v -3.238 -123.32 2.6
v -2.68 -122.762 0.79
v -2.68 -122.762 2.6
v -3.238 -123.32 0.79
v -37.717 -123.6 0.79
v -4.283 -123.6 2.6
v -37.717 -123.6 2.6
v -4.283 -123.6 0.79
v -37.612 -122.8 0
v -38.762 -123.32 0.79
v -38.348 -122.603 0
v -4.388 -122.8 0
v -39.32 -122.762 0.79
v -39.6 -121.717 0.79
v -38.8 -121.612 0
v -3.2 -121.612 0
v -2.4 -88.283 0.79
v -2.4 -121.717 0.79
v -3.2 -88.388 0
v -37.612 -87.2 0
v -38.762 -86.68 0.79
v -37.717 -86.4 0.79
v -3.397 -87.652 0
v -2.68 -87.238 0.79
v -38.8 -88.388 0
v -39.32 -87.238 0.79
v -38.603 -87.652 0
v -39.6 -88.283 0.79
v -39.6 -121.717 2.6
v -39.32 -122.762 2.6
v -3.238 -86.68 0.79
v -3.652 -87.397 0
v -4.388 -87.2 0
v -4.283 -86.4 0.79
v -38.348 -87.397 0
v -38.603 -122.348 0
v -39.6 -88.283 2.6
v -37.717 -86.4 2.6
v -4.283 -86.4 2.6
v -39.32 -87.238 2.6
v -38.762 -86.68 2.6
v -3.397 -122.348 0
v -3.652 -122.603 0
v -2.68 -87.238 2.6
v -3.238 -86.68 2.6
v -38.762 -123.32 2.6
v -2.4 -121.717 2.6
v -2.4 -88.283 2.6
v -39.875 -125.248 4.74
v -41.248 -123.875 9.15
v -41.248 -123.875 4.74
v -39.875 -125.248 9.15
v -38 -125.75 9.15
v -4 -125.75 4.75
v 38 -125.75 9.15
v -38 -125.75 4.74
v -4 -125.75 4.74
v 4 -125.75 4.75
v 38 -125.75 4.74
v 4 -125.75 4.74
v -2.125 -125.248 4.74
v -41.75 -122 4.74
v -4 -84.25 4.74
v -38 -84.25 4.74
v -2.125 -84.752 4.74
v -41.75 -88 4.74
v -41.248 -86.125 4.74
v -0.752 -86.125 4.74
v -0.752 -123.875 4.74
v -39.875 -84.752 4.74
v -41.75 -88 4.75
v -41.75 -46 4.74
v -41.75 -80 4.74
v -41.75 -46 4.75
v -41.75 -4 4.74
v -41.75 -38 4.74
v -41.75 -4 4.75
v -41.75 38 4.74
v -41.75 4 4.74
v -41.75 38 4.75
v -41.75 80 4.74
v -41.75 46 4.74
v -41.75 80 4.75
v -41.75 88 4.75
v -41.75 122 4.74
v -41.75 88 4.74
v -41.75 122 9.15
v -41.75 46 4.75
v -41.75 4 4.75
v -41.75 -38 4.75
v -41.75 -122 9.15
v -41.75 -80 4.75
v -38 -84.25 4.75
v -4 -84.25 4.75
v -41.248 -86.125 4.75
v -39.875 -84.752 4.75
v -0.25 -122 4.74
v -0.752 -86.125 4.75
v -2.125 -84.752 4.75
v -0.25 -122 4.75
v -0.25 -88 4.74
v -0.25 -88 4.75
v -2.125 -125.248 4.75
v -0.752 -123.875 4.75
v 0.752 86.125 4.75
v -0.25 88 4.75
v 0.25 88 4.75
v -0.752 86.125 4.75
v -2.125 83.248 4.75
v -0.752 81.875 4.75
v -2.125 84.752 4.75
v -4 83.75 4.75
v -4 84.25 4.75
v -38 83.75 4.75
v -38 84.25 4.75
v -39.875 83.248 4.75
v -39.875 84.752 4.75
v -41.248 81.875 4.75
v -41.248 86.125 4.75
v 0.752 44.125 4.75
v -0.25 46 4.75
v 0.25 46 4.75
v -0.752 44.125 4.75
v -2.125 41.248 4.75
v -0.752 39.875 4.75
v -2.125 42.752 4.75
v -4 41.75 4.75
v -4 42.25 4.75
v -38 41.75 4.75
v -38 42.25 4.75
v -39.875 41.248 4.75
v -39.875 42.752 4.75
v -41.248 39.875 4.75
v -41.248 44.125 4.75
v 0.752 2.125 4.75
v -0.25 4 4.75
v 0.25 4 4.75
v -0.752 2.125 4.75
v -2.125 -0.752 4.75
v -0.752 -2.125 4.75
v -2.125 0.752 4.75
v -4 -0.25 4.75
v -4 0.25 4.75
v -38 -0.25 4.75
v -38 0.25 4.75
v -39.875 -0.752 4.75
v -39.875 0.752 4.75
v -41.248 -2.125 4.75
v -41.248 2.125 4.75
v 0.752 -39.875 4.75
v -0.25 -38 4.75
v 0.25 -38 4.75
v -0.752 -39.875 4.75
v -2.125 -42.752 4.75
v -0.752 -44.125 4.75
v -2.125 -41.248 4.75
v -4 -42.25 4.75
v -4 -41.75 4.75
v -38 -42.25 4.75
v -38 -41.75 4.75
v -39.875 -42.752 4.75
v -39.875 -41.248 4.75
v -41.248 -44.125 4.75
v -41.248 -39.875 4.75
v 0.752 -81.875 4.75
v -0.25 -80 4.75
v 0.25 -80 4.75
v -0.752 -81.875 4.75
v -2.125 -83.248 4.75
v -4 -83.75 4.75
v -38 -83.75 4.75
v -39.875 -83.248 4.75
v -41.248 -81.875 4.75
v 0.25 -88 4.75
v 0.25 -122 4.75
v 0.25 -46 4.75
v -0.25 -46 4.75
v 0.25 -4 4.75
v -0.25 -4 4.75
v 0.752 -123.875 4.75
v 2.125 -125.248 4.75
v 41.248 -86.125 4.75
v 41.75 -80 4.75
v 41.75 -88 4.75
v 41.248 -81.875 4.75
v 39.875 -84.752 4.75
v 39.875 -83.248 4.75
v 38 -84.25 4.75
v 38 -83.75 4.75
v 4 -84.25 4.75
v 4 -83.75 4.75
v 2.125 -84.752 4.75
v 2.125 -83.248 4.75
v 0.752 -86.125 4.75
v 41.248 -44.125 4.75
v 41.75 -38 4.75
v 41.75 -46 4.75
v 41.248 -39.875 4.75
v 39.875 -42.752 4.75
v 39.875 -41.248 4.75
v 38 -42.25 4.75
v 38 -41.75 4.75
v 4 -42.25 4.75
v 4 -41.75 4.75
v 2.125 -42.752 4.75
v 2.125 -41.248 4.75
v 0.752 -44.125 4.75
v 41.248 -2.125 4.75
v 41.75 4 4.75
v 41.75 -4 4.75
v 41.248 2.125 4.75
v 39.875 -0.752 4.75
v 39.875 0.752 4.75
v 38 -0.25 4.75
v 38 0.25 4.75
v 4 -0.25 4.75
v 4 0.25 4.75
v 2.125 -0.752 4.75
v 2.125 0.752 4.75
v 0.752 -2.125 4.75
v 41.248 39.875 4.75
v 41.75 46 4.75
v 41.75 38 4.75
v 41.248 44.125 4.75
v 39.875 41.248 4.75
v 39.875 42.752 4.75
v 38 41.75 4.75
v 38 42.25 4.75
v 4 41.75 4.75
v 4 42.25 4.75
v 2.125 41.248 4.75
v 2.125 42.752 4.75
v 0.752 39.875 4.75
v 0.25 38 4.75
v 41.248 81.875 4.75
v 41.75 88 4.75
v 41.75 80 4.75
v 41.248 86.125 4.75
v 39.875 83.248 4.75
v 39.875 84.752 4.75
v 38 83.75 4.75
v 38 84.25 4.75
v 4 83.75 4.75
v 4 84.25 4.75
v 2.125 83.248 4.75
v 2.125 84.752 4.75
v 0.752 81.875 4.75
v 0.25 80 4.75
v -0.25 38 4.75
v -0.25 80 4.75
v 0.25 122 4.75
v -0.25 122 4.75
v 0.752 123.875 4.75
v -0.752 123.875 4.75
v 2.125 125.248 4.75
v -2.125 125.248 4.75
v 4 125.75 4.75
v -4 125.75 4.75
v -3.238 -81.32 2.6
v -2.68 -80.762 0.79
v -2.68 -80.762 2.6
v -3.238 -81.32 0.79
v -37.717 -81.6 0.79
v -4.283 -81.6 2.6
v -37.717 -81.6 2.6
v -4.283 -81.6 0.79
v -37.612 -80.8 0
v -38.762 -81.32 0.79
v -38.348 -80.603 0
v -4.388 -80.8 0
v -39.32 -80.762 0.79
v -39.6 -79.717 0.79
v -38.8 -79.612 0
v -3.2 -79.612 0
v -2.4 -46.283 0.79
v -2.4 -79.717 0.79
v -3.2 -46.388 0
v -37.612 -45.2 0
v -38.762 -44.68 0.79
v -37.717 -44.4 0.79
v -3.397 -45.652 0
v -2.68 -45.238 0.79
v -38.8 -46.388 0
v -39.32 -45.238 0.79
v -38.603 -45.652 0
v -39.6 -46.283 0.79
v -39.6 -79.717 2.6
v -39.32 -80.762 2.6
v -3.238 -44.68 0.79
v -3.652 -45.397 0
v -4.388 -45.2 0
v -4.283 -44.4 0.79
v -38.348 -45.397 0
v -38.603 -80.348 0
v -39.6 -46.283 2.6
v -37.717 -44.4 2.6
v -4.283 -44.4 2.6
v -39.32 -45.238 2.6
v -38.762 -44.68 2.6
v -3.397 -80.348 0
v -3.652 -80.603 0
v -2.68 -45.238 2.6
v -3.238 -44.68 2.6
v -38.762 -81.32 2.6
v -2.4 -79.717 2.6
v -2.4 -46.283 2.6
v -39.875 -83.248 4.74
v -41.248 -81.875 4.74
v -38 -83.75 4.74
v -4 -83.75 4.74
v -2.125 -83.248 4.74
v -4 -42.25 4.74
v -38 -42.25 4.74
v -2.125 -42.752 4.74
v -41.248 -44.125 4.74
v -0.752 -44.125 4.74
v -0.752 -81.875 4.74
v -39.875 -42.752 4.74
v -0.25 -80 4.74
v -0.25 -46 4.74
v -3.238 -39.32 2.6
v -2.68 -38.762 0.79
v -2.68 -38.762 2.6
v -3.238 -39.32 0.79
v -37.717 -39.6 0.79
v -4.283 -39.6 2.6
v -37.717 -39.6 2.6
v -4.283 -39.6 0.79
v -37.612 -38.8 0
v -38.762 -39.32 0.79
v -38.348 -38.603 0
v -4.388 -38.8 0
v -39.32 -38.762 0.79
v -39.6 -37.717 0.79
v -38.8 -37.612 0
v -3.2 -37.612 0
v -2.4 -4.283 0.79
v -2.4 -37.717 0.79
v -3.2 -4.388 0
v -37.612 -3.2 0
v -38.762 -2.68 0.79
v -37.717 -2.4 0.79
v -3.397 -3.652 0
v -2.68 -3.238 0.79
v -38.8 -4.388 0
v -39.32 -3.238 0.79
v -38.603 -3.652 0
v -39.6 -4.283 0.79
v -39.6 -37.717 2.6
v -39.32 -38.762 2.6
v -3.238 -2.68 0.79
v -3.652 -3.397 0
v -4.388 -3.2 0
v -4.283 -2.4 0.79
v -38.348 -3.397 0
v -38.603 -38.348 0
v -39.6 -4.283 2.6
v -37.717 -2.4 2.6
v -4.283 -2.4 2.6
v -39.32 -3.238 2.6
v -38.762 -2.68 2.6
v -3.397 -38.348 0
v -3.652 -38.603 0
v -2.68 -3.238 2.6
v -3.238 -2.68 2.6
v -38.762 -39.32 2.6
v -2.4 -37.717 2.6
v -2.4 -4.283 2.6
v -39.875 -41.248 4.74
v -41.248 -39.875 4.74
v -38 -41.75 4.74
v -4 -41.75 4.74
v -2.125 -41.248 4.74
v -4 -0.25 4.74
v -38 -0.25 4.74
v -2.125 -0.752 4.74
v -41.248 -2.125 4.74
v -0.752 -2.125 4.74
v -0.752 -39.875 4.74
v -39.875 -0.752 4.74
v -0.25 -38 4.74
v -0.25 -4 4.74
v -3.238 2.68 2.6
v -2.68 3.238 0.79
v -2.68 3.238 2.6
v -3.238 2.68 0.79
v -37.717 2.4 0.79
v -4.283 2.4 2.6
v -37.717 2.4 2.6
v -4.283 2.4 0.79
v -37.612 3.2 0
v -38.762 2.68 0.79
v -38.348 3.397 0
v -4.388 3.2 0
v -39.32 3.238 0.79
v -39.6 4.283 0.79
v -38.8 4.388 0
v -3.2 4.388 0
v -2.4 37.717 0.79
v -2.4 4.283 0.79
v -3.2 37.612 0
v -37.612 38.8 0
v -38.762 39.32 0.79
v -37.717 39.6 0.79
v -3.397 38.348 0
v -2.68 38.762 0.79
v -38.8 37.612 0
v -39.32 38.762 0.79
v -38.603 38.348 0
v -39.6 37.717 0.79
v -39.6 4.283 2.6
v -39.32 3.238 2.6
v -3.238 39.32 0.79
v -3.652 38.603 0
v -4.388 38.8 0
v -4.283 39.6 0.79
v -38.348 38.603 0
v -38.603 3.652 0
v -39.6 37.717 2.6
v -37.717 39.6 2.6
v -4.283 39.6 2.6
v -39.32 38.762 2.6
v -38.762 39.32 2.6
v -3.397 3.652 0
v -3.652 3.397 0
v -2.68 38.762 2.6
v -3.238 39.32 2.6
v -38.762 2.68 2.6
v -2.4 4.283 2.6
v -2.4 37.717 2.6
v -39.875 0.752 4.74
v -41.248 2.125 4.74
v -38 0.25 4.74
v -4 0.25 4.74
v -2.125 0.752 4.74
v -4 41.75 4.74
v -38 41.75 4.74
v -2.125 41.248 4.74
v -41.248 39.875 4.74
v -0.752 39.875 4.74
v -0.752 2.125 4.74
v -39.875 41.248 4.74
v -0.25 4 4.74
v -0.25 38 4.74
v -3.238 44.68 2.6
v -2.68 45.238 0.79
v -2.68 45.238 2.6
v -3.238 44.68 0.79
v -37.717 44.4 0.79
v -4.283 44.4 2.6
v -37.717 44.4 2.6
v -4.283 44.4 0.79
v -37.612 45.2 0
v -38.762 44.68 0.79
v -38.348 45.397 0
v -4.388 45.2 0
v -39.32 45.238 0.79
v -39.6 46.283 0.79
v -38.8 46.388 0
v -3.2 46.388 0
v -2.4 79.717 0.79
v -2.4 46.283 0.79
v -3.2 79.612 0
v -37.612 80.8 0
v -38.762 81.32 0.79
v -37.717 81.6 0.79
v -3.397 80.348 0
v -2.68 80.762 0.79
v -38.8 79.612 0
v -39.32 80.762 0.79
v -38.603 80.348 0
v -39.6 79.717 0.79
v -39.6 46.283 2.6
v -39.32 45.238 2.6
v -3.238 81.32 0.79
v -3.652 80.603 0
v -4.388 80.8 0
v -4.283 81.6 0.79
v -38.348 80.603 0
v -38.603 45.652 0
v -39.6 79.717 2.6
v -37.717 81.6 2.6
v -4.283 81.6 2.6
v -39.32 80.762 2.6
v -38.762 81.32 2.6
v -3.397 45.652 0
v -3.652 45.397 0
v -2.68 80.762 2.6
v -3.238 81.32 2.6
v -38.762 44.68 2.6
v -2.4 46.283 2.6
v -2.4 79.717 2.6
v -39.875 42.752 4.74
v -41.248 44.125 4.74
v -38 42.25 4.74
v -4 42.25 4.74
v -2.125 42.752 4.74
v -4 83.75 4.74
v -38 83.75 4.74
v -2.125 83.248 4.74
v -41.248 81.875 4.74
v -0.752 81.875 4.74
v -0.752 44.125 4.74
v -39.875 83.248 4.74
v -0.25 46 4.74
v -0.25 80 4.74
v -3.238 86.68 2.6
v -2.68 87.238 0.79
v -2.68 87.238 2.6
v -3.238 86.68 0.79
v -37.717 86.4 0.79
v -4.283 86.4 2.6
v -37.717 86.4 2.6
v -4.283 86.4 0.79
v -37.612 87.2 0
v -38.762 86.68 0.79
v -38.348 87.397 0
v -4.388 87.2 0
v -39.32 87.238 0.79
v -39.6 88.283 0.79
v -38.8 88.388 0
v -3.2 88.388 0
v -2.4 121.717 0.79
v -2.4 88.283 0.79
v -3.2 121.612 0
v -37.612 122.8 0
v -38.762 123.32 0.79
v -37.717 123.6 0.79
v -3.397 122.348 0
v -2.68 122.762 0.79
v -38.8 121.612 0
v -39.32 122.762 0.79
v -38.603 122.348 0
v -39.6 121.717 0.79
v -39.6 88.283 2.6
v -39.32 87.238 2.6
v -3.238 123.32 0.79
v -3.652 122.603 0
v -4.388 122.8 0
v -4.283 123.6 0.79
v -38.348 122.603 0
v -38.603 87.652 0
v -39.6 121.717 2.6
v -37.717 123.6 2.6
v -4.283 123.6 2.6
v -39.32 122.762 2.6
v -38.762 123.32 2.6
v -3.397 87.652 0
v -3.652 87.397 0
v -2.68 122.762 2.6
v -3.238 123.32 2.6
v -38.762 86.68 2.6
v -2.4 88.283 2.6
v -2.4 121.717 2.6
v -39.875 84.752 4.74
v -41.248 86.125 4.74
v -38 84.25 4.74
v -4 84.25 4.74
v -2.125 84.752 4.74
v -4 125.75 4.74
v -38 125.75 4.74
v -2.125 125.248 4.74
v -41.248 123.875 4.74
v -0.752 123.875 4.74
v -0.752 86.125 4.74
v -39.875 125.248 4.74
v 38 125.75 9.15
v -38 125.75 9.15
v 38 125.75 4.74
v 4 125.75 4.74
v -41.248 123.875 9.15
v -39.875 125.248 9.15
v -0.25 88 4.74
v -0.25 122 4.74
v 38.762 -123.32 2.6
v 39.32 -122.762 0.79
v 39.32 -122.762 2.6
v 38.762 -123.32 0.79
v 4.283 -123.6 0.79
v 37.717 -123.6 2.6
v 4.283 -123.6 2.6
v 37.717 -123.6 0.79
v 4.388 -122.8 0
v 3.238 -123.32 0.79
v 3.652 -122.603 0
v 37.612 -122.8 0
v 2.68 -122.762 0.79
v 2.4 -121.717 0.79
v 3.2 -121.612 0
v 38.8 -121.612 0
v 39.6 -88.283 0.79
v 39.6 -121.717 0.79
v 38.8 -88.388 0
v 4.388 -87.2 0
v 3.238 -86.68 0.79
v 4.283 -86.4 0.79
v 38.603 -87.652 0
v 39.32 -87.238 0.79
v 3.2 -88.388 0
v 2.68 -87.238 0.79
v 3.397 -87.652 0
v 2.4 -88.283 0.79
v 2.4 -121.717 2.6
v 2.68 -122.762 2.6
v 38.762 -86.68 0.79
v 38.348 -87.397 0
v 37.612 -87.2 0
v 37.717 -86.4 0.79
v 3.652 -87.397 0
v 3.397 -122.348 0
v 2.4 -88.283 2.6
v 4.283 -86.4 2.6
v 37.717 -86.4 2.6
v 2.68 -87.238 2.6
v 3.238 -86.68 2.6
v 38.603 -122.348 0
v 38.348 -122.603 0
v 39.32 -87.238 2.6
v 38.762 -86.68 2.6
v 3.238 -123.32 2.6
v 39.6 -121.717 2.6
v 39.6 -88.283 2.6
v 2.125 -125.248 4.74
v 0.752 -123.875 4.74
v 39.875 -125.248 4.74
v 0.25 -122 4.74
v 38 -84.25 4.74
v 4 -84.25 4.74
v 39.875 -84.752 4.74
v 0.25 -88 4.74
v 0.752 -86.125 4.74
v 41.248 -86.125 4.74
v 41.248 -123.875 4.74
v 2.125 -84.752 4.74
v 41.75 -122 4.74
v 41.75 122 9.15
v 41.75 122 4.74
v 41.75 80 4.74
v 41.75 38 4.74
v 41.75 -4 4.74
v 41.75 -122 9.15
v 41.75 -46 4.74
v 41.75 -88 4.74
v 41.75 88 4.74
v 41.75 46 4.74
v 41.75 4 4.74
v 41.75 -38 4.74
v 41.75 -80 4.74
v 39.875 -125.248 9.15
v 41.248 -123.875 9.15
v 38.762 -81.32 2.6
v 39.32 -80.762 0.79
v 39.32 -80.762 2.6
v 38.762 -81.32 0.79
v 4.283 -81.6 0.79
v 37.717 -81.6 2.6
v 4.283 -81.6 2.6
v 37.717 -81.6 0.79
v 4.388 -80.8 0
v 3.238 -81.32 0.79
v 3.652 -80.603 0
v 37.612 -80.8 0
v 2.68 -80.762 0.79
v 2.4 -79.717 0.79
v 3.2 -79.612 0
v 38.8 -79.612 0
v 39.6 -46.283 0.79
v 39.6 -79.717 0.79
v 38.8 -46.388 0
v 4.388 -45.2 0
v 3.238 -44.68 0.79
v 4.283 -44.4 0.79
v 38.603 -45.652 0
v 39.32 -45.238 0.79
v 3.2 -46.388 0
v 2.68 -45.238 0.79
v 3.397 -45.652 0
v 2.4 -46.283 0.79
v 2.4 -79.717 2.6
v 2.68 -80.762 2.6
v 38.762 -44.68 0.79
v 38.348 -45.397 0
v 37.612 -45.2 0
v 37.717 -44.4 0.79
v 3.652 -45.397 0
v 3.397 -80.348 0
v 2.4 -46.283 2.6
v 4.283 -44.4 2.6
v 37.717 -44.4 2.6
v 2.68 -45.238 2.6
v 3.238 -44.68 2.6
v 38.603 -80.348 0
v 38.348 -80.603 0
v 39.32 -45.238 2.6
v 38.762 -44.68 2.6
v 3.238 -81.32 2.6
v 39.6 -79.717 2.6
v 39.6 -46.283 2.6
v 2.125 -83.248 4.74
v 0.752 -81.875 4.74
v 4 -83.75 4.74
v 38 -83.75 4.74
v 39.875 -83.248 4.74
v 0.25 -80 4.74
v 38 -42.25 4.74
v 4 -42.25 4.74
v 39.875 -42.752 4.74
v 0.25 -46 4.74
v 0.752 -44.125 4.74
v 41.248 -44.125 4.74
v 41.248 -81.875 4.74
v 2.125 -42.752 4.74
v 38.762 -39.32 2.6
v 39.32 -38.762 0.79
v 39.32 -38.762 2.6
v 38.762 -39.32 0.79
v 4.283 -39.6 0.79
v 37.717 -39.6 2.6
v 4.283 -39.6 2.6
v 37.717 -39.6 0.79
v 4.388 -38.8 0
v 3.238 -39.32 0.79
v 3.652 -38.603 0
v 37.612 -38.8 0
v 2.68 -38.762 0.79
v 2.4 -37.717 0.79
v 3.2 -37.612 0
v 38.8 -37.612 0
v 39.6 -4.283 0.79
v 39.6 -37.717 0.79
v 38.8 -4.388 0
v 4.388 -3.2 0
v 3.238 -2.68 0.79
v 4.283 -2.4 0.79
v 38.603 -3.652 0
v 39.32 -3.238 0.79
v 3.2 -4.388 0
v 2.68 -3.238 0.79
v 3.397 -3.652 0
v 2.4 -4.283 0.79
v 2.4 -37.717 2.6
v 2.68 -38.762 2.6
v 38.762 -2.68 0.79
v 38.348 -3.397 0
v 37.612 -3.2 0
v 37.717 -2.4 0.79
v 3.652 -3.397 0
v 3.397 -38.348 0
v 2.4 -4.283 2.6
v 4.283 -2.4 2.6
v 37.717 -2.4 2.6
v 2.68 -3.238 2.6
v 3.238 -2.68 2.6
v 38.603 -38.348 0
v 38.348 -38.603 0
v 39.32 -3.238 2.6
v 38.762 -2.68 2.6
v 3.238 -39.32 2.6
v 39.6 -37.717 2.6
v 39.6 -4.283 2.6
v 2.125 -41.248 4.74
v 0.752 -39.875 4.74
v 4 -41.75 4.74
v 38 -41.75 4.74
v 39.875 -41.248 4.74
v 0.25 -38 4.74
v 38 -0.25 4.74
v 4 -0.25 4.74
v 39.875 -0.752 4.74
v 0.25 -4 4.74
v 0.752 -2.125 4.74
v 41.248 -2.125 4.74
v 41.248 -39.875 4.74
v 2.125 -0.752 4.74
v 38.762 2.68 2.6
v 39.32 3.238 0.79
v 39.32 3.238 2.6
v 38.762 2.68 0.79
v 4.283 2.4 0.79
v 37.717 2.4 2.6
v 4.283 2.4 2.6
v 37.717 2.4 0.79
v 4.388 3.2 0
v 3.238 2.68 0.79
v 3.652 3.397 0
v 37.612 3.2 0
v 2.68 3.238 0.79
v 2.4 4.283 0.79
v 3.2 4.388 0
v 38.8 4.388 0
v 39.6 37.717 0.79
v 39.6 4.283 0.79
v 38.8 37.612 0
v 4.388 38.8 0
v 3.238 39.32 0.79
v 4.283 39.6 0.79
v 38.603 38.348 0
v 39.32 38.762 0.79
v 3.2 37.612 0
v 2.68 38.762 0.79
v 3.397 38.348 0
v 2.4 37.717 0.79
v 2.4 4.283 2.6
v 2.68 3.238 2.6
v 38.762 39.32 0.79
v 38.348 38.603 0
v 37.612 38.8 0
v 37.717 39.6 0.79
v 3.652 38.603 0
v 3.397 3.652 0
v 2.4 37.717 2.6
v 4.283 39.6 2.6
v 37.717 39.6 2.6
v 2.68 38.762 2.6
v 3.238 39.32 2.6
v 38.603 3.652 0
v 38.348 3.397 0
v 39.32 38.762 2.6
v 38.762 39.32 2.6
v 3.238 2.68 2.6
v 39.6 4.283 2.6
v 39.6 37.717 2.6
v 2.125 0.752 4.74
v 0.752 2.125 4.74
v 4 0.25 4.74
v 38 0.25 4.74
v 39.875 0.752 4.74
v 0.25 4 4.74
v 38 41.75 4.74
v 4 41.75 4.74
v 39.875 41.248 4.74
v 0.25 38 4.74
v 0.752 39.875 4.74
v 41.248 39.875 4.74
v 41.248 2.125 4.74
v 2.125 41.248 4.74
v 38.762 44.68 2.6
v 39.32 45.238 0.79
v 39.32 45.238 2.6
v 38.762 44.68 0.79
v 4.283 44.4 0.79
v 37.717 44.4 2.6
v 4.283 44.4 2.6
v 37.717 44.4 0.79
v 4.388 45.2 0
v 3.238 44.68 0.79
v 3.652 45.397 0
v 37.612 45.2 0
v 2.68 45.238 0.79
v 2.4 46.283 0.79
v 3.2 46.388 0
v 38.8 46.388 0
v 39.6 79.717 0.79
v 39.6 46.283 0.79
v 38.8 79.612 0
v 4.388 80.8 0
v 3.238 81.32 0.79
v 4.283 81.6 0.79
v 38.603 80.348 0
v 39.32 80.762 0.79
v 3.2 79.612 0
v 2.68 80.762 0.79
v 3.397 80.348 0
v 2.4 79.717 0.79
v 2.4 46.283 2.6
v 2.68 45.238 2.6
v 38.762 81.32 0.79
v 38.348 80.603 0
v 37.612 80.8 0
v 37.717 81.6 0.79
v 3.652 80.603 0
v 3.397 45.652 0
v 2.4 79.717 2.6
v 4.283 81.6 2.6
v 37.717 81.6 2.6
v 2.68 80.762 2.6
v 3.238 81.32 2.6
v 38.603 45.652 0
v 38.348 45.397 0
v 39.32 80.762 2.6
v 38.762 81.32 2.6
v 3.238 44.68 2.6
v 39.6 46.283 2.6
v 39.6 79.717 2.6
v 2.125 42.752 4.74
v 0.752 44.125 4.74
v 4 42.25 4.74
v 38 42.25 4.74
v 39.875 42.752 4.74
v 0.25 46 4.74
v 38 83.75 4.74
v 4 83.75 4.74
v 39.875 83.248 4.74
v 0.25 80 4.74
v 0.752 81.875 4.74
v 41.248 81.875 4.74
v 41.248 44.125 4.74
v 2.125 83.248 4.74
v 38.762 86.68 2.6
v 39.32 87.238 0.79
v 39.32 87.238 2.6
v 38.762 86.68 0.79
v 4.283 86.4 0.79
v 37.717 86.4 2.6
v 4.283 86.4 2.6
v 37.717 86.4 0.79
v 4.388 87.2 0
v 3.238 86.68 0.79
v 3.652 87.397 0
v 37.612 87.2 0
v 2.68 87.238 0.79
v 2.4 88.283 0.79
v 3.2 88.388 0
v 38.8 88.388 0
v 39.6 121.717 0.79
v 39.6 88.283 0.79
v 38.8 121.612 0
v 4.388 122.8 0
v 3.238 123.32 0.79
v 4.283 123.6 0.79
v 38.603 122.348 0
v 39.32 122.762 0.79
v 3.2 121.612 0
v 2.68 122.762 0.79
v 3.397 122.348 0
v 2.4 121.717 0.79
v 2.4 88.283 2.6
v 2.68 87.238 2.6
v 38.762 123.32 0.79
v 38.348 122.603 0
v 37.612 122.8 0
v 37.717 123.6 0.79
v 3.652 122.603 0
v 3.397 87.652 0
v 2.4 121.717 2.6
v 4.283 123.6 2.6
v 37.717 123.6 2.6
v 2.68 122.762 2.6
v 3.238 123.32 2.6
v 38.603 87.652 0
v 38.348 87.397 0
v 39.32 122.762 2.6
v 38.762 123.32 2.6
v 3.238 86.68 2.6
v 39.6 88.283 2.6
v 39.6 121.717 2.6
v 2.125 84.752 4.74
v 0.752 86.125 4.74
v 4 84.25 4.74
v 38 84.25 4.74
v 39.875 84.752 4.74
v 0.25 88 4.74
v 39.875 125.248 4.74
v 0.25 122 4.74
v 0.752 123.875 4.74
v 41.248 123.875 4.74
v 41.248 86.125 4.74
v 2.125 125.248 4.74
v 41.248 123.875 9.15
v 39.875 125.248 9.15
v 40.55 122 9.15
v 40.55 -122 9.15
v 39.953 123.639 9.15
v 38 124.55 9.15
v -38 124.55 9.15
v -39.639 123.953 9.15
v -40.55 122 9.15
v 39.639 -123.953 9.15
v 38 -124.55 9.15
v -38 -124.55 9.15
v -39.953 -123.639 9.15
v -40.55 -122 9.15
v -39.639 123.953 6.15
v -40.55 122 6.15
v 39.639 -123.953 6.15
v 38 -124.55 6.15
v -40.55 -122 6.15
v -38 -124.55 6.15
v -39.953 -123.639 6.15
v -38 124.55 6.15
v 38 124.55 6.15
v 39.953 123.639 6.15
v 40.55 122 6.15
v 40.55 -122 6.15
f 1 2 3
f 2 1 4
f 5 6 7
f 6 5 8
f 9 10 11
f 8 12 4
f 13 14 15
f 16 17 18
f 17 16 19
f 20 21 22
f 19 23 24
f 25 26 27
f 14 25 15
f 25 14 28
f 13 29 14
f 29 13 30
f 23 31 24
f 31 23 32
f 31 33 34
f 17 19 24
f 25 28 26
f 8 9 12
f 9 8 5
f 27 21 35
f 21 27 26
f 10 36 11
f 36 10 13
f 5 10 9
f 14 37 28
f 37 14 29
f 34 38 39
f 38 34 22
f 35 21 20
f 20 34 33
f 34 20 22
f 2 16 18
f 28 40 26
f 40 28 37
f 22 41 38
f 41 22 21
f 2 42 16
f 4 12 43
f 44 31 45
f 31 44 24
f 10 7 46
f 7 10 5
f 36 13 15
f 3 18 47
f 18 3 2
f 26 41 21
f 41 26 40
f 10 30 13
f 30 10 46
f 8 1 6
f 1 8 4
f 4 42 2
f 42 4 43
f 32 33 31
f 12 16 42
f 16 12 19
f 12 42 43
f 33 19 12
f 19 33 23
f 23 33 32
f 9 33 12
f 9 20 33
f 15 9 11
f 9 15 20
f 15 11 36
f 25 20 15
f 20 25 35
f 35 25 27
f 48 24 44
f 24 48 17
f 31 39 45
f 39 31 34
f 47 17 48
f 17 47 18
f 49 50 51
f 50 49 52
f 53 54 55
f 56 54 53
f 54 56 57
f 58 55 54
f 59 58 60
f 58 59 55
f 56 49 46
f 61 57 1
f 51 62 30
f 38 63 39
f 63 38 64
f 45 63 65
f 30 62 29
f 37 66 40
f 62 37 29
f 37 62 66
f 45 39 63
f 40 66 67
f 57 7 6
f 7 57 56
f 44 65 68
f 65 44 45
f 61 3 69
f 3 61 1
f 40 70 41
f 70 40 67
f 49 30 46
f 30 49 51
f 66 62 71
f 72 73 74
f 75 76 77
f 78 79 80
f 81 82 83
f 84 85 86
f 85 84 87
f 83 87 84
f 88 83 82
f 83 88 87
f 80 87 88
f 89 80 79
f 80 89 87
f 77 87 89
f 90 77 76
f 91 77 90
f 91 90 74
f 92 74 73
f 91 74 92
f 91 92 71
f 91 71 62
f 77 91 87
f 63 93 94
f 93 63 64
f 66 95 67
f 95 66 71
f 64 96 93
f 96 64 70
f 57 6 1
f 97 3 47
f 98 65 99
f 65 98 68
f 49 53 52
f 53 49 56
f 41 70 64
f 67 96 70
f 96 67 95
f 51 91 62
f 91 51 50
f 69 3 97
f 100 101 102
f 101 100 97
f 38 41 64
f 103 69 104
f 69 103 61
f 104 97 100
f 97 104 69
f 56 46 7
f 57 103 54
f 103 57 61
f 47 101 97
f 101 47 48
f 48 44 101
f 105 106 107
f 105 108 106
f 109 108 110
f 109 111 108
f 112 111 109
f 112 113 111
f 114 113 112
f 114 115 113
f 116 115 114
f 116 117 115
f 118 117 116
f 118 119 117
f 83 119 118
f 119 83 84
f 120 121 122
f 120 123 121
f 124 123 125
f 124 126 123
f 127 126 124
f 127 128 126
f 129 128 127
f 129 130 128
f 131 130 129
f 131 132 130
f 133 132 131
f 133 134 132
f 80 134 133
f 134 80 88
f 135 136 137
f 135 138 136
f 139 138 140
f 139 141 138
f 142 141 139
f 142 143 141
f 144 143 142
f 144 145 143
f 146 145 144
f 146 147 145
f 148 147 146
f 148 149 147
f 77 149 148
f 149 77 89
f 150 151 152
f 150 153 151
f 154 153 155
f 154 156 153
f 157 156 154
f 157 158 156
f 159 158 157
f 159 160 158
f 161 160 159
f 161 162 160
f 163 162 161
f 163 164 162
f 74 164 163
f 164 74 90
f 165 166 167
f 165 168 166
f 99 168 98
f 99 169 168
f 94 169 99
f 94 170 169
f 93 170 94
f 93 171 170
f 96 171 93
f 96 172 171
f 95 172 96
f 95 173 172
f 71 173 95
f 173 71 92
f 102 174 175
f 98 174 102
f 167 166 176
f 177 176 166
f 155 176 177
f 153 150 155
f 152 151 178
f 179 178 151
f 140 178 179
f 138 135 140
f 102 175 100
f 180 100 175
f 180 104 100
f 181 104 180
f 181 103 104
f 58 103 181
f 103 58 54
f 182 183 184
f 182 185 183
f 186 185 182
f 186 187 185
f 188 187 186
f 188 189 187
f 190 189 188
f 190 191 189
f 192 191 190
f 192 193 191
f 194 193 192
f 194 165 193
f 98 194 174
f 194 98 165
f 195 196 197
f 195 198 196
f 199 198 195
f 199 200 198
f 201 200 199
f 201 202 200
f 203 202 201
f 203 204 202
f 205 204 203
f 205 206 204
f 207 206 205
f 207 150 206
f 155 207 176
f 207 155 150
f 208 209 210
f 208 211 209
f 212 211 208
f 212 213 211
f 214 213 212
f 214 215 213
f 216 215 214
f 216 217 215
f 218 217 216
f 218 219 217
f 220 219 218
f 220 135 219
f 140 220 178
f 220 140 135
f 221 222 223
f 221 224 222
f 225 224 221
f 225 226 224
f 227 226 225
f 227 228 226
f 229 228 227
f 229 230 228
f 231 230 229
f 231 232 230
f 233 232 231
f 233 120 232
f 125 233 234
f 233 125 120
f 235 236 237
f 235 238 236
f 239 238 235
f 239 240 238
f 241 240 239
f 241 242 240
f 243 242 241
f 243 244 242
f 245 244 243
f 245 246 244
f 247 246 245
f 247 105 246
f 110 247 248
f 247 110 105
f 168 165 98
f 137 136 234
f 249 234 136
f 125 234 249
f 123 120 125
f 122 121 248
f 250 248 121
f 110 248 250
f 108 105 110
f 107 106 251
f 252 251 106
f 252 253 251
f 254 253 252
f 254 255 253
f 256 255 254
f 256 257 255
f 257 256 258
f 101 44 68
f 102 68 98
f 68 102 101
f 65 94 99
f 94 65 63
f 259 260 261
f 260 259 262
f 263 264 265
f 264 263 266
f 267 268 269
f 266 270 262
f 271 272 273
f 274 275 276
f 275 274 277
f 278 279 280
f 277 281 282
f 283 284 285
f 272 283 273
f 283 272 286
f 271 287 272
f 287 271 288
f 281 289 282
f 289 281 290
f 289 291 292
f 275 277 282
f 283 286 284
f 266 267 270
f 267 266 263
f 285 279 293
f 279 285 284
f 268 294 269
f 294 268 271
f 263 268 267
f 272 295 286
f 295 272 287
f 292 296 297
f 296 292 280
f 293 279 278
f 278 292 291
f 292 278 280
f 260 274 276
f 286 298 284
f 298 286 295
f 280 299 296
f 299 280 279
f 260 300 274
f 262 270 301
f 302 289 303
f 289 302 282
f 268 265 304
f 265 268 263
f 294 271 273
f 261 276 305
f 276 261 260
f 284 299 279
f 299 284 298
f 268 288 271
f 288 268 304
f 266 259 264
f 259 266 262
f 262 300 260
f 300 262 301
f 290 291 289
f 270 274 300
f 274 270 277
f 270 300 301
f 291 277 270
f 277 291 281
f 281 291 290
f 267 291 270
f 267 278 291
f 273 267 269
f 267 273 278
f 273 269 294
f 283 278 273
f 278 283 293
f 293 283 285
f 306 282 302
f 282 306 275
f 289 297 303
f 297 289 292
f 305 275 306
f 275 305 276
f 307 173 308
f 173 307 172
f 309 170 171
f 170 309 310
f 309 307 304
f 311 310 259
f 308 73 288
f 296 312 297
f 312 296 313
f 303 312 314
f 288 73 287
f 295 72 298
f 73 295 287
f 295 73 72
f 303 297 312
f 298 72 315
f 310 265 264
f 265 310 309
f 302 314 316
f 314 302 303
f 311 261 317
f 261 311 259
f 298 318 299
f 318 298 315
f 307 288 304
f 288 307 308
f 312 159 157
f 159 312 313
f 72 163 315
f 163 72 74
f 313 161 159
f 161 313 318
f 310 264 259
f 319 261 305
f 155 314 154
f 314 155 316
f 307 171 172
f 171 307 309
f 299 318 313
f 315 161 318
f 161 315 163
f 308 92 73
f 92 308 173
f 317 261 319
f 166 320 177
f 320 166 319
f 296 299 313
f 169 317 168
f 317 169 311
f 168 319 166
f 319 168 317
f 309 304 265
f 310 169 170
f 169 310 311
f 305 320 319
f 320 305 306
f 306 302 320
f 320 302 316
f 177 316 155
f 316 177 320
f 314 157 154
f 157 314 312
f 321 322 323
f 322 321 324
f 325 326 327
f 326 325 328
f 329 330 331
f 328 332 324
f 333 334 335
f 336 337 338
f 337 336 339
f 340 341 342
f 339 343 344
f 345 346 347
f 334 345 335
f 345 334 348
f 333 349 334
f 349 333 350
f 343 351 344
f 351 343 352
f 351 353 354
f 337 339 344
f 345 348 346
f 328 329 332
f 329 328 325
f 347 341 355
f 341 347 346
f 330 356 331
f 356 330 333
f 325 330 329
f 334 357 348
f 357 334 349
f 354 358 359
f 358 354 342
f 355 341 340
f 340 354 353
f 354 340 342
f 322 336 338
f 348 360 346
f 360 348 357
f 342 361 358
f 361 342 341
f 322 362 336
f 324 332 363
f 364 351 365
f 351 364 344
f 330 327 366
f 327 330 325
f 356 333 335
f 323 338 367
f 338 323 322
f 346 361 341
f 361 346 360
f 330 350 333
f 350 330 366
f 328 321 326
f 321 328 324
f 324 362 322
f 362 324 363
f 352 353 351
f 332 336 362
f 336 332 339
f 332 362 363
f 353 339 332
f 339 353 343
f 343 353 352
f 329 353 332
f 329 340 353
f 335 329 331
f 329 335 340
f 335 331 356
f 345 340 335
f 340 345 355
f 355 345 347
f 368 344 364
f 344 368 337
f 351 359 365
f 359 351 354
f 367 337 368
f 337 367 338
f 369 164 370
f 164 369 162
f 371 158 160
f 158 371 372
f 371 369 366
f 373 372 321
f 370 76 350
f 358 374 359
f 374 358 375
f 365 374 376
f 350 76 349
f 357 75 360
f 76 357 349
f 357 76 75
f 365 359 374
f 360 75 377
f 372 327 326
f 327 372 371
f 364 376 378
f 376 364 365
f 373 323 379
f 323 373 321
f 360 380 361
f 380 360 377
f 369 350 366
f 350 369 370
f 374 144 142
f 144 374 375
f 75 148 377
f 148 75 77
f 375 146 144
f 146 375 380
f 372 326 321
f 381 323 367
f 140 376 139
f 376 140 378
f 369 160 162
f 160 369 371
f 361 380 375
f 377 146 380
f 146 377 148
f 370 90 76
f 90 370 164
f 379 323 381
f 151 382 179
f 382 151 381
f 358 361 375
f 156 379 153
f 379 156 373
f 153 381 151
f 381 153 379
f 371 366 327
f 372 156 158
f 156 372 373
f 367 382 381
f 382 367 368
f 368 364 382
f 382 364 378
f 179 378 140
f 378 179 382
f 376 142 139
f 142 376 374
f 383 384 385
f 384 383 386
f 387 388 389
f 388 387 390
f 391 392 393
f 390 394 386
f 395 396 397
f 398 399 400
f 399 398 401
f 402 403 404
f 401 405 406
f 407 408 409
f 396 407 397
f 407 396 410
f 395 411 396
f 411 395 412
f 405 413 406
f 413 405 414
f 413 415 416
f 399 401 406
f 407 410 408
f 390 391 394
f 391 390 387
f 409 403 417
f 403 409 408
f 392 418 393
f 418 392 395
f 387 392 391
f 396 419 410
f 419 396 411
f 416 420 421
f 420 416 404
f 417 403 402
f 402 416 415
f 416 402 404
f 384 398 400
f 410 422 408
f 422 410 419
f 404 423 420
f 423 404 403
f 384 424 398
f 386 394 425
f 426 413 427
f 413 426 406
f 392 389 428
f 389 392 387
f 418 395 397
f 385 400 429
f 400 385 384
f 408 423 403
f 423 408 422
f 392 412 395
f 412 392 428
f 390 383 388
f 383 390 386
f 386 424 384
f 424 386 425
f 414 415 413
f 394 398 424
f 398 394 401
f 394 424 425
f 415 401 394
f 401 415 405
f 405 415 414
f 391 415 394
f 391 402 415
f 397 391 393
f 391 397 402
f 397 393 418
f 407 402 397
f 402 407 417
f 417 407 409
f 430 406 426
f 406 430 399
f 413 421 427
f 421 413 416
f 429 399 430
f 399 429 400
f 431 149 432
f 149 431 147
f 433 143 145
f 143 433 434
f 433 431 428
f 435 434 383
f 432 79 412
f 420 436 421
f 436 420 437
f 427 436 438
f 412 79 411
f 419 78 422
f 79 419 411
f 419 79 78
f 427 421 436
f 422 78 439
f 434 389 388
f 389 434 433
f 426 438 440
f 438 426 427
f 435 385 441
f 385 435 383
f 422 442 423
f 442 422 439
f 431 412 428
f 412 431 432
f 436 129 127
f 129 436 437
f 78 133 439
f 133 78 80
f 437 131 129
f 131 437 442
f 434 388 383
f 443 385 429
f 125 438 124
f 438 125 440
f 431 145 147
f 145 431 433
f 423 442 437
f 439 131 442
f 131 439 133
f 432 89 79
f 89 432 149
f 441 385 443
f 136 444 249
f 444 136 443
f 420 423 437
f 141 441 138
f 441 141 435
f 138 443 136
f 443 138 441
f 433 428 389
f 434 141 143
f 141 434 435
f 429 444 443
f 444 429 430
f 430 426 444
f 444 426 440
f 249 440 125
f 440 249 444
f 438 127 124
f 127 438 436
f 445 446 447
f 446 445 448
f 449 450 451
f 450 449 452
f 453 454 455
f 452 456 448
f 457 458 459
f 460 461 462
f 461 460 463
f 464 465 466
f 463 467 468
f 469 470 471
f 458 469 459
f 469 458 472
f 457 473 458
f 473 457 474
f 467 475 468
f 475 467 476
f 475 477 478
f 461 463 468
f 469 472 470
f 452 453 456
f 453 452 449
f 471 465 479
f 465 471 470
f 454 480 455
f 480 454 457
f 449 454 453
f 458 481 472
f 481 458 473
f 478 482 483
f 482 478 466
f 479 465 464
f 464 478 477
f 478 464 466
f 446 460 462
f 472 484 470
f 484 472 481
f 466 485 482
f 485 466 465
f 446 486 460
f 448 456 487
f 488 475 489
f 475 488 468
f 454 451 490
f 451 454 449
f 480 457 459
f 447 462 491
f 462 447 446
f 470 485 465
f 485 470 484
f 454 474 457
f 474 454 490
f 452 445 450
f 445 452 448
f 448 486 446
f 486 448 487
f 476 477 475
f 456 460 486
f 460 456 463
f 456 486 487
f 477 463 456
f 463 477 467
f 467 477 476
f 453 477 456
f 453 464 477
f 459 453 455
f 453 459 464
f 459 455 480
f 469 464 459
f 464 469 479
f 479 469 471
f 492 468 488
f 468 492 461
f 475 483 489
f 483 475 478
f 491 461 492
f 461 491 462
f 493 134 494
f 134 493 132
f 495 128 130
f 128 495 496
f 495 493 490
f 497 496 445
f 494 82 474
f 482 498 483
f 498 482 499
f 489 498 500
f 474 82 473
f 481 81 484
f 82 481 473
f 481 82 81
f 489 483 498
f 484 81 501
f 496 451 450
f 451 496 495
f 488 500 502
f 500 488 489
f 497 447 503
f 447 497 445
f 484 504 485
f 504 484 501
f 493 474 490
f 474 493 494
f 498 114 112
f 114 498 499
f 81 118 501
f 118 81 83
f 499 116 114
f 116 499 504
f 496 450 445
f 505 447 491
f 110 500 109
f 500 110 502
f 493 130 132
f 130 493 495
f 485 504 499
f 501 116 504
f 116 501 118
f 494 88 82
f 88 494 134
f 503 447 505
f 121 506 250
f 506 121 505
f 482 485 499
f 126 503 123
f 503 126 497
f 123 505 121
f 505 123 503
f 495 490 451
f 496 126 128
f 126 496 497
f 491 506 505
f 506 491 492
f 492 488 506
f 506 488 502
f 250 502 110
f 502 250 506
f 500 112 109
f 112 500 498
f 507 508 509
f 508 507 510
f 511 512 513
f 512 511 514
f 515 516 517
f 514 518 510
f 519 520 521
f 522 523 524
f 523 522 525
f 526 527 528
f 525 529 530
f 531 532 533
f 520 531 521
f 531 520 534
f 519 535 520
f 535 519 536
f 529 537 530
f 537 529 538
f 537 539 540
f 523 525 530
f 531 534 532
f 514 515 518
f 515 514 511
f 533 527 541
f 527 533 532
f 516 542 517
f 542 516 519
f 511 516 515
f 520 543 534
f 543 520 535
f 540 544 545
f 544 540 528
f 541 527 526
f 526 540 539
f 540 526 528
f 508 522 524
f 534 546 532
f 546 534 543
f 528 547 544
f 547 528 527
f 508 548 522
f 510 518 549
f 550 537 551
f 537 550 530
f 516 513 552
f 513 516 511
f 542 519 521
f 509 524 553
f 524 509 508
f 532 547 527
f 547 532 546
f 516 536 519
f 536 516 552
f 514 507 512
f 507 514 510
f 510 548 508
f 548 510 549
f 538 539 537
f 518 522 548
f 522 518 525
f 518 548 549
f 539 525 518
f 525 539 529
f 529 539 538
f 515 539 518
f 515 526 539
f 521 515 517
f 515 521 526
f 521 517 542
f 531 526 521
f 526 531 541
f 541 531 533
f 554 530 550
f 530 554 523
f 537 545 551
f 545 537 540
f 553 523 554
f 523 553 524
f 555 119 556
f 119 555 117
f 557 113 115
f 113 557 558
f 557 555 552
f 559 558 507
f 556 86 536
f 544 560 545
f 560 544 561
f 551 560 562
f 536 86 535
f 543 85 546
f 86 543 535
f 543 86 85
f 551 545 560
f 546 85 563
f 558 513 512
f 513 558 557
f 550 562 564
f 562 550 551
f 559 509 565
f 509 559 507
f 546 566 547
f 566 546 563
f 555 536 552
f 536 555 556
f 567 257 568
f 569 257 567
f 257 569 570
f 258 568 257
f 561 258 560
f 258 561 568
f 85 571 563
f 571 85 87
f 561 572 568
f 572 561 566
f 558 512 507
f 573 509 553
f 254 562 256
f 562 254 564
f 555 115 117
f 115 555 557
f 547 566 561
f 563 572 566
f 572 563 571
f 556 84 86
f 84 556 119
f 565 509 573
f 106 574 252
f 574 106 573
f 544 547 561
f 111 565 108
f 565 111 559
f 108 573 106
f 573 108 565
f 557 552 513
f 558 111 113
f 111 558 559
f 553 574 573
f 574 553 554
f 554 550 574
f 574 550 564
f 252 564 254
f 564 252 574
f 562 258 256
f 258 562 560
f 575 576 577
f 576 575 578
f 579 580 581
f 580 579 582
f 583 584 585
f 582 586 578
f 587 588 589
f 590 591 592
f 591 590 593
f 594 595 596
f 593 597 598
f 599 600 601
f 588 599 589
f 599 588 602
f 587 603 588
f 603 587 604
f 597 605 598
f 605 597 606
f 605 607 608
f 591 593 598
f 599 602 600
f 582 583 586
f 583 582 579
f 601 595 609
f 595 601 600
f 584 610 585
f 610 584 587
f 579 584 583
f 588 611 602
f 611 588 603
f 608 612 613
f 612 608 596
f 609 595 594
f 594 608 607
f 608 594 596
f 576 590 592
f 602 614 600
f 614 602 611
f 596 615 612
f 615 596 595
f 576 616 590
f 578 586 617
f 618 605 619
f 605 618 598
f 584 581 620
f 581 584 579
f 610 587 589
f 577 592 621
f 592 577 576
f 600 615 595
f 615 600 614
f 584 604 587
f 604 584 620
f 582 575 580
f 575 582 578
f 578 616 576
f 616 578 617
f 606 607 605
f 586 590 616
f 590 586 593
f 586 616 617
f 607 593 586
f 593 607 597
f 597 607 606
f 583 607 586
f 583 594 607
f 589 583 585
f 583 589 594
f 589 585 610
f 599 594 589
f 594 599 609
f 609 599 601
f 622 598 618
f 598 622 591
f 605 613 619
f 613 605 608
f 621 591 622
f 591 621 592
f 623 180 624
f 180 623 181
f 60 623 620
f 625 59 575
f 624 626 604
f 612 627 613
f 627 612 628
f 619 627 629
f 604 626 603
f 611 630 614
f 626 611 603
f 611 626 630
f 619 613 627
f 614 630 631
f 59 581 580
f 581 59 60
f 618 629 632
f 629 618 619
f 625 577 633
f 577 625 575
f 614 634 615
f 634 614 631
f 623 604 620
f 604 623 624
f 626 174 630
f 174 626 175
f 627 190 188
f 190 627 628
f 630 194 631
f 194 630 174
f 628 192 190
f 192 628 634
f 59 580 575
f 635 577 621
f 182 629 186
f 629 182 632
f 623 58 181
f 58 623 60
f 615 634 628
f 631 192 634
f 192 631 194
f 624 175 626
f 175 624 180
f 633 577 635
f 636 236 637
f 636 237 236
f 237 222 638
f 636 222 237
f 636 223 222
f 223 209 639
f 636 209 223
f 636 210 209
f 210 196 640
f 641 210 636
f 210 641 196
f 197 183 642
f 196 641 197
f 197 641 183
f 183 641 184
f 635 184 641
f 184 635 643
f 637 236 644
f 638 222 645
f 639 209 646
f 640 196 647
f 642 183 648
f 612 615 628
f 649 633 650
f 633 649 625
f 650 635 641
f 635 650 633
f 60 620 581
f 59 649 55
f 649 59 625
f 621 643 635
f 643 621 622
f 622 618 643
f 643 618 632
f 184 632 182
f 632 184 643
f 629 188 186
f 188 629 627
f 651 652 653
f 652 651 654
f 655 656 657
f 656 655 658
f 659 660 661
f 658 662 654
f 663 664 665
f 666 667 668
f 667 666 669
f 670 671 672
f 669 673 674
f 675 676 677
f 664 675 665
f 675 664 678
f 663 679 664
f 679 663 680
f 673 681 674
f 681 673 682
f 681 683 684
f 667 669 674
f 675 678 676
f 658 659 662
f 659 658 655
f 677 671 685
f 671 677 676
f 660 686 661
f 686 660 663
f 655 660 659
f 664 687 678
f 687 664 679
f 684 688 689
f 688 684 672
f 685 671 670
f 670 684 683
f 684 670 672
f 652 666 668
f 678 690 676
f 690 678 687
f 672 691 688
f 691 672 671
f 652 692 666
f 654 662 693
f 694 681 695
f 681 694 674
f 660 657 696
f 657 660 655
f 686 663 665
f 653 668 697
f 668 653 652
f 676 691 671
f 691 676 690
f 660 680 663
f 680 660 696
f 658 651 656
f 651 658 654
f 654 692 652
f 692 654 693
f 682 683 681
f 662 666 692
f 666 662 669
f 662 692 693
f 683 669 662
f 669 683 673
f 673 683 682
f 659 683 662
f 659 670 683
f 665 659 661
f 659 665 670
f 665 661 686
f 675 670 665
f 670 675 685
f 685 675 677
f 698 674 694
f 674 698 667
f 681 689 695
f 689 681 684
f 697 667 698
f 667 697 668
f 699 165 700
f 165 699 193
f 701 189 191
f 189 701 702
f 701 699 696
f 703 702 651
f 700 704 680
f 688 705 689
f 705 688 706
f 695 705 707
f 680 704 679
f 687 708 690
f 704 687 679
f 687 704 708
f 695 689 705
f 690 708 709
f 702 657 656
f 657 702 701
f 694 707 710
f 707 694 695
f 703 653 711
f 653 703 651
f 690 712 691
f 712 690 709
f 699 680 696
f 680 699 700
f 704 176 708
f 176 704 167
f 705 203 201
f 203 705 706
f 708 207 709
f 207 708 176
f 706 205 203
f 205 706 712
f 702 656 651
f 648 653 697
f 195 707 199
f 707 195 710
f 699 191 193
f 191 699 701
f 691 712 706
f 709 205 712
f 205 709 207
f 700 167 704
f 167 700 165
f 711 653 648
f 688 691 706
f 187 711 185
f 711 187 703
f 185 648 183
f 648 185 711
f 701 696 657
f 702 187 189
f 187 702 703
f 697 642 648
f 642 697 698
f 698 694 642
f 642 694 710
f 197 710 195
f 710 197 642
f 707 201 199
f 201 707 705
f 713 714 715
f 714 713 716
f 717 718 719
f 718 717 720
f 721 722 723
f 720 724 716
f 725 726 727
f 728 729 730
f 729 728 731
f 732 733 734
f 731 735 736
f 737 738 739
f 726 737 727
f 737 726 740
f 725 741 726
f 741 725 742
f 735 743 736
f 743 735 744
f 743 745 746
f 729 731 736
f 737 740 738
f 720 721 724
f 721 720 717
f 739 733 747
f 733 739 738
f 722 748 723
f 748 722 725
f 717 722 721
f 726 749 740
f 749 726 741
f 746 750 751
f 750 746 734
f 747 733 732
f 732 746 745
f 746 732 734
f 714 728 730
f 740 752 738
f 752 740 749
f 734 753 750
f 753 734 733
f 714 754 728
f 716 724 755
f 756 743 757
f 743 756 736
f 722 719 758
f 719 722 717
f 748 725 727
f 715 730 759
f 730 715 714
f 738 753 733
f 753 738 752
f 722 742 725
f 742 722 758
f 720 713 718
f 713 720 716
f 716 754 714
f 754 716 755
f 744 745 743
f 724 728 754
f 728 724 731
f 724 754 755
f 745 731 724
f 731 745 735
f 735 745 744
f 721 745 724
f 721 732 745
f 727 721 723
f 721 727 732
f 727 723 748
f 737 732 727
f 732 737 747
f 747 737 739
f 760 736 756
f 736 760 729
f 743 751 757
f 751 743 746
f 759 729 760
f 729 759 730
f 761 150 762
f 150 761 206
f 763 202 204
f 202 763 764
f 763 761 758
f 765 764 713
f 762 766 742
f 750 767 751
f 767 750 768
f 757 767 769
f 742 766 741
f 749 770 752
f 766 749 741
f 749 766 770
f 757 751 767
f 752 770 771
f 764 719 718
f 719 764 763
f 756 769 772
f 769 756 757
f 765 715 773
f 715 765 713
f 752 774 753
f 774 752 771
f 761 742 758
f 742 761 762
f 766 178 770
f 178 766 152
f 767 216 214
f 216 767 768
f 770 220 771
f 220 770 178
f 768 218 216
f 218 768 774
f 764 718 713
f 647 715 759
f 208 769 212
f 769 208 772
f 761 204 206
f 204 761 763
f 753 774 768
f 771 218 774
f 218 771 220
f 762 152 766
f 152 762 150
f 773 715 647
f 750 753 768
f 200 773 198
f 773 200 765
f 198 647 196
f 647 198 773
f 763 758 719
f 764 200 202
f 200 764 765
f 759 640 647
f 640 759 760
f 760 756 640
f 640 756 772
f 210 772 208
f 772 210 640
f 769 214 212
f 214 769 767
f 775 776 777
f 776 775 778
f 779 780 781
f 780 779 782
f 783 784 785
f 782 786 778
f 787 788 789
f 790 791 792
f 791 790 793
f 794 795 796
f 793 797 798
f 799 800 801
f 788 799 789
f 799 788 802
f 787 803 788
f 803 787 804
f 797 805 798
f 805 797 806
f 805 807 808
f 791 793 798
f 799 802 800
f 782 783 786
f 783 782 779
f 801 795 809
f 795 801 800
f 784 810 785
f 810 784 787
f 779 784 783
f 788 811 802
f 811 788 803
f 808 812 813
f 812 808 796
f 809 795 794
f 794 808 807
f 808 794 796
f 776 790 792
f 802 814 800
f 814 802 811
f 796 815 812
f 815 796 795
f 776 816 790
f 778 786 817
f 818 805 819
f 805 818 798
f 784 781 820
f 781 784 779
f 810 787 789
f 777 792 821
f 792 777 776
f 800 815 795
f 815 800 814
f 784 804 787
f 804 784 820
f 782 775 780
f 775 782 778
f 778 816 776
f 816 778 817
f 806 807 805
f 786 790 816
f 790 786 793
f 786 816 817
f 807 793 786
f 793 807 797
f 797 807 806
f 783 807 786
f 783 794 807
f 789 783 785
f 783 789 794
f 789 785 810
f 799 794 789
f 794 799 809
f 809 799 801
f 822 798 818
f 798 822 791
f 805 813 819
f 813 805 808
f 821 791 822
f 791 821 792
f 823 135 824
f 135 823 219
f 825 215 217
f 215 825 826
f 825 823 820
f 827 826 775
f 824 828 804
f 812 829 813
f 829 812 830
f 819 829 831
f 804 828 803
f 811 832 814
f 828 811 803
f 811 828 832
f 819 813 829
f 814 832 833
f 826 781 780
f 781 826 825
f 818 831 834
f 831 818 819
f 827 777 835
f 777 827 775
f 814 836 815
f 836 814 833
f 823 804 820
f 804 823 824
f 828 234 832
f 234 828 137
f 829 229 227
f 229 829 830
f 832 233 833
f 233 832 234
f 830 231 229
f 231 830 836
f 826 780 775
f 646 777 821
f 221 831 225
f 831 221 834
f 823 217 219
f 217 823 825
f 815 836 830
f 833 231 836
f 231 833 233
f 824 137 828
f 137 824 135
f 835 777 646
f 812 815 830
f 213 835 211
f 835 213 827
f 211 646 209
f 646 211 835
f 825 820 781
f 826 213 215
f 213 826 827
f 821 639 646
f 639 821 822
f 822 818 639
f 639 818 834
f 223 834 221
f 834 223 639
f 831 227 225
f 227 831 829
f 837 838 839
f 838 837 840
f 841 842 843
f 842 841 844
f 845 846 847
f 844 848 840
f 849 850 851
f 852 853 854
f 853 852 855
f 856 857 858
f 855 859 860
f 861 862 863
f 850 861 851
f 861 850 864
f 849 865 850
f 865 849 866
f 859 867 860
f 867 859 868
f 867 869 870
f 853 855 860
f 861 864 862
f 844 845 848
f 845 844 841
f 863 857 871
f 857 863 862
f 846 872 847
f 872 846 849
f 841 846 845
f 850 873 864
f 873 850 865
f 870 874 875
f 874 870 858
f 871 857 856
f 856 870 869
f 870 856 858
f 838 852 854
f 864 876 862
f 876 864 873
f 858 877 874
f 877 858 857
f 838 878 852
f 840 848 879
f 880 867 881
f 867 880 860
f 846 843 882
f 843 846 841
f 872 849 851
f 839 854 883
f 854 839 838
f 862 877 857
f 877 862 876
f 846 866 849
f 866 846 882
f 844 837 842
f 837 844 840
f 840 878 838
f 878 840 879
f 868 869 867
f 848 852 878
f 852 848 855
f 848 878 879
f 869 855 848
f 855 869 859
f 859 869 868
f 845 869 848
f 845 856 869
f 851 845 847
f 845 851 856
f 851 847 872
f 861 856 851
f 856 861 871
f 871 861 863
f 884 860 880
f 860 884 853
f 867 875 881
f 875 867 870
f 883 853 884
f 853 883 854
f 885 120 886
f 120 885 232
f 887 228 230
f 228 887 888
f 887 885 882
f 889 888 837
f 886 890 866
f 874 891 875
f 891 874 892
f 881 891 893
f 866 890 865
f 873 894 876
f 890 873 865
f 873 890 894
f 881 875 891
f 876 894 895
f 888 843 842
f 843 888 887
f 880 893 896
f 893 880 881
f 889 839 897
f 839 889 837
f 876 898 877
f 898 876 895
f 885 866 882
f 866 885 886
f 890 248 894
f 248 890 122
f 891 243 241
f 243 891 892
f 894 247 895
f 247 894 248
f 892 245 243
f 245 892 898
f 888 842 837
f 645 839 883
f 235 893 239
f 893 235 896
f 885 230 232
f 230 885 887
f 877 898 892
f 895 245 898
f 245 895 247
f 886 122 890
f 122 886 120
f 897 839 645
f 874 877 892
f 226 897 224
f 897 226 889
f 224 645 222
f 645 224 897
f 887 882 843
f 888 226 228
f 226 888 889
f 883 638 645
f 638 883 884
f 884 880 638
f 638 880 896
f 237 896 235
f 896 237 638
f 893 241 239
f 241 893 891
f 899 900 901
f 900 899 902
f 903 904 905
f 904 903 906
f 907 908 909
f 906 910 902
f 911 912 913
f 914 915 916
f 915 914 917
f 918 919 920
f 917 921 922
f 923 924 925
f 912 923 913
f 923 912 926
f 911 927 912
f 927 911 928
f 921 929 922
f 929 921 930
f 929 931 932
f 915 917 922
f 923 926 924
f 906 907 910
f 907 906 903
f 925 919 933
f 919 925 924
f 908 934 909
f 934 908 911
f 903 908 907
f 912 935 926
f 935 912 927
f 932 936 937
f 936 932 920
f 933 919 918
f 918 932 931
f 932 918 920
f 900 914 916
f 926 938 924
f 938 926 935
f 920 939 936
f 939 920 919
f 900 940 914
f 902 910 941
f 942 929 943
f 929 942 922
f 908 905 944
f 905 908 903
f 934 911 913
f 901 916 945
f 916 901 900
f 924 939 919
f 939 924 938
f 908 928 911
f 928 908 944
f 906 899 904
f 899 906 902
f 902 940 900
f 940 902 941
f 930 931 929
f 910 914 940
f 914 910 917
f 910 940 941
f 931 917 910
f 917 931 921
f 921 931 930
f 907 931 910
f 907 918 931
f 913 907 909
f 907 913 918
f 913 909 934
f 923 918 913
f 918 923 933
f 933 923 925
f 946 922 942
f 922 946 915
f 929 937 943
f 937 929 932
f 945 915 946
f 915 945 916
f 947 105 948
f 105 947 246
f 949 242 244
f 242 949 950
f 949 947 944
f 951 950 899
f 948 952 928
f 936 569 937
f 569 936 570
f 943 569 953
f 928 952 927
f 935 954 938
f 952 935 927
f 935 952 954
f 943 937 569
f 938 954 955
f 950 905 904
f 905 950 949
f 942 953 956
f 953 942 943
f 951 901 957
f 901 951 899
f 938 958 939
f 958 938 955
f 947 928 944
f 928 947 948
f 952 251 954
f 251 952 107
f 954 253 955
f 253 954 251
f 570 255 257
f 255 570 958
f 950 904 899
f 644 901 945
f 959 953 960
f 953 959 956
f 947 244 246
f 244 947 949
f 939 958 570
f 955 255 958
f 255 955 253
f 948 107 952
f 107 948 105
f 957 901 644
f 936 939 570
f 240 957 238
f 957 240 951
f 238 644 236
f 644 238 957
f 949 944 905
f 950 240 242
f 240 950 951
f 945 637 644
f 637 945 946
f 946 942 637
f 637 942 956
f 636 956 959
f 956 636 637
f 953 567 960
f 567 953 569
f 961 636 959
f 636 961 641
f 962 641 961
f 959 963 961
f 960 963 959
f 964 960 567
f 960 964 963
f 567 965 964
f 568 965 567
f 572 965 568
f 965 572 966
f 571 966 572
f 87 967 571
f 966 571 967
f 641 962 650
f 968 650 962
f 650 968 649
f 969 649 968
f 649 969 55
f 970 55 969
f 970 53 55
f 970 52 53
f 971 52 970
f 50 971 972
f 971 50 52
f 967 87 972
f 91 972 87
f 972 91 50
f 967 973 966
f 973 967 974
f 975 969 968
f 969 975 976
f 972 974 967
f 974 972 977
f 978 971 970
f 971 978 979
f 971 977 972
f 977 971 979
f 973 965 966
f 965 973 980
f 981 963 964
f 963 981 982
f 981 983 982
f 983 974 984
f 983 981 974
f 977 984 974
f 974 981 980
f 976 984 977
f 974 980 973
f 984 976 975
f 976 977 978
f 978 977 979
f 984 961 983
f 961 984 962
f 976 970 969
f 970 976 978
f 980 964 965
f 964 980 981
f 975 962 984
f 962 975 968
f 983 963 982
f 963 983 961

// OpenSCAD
// file: psu_plate_common.scad
// psu_plate_common — shared parameters for the power-supply plates.
//
// These are PLATES, not bins: a power supply stands on top, and the only wall is
// a short lip to stop it walking off. They latch into the baseplate on standard
// Gridfinity feet like everything else, so the PSU stops sliding on the desk and
// the grid underneath it stays usable.
include <../lib/gridfinity.scad>

// Lip height ABOVE the plate floor. Deliberately small — tall enough to catch a
// foot that shifts, short enough not to interfere with a PSU's own feet or make
// the unit a lift-out. Total part height is BIN_BASE_H + FLOOR + LIP.
LIP   = 3.0;   // [1:0.5:8]
FLOOR = 1.4;

PLATE_H = BIN_BASE_H + FLOOR + LIP;
// main file
// plate_2x6 — 2×6 plate with a short lip, for a power supply to stand on.
//
// PRINT: as emitted, feet down. No supports.
include <psu_plate_common.scad>
bin(2, 6, PLATE_H, floor = FLOOR);
